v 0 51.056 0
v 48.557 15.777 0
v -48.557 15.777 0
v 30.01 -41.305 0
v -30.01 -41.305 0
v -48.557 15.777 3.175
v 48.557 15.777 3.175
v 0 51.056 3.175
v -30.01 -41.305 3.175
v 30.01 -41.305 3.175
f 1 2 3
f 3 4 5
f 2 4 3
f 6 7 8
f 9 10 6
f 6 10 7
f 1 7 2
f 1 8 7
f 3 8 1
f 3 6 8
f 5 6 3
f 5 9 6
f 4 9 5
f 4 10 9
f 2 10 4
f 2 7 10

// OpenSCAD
/* =====================================================
   Regular Pentagon Plate (solid)
   =====================================================
   Regular pentagon, extruded to a flat solid plate.
   Dimensions are specified in inches and converted to mm.

   Side length : 2.363 in  (60.0202 mm)
   Thickness   : 1/8 in    ( 3.1750 mm)

   Prints flat on the bed, no supports.
   ===================================================== */

in = 25.4;   // mm per inch

/* ── Dimensions (inches) ────────────────────────────── */
side_in      = 2.363;    // length of each of the five sides
thickness_in = 1/8;      // plate thickness

/* ── Derived (mm) ───────────────────────────────── */
S = side_in      * in;
Z = thickness_in * in;
R = S / (2 * sin(180 / 5));  // circumradius

module pentagon_plate() {
    // Centered on X/Y, point-up with a flat bottom edge, sitting on Z = 0.
    linear_extrude(height = Z)
        polygon([
            for (i = [0 : 4])
                [R * cos(90 + i * 360 / 5),
                 R * sin(90 + i * 360 / 5)]
        ]);
}

pentagon_plate();
